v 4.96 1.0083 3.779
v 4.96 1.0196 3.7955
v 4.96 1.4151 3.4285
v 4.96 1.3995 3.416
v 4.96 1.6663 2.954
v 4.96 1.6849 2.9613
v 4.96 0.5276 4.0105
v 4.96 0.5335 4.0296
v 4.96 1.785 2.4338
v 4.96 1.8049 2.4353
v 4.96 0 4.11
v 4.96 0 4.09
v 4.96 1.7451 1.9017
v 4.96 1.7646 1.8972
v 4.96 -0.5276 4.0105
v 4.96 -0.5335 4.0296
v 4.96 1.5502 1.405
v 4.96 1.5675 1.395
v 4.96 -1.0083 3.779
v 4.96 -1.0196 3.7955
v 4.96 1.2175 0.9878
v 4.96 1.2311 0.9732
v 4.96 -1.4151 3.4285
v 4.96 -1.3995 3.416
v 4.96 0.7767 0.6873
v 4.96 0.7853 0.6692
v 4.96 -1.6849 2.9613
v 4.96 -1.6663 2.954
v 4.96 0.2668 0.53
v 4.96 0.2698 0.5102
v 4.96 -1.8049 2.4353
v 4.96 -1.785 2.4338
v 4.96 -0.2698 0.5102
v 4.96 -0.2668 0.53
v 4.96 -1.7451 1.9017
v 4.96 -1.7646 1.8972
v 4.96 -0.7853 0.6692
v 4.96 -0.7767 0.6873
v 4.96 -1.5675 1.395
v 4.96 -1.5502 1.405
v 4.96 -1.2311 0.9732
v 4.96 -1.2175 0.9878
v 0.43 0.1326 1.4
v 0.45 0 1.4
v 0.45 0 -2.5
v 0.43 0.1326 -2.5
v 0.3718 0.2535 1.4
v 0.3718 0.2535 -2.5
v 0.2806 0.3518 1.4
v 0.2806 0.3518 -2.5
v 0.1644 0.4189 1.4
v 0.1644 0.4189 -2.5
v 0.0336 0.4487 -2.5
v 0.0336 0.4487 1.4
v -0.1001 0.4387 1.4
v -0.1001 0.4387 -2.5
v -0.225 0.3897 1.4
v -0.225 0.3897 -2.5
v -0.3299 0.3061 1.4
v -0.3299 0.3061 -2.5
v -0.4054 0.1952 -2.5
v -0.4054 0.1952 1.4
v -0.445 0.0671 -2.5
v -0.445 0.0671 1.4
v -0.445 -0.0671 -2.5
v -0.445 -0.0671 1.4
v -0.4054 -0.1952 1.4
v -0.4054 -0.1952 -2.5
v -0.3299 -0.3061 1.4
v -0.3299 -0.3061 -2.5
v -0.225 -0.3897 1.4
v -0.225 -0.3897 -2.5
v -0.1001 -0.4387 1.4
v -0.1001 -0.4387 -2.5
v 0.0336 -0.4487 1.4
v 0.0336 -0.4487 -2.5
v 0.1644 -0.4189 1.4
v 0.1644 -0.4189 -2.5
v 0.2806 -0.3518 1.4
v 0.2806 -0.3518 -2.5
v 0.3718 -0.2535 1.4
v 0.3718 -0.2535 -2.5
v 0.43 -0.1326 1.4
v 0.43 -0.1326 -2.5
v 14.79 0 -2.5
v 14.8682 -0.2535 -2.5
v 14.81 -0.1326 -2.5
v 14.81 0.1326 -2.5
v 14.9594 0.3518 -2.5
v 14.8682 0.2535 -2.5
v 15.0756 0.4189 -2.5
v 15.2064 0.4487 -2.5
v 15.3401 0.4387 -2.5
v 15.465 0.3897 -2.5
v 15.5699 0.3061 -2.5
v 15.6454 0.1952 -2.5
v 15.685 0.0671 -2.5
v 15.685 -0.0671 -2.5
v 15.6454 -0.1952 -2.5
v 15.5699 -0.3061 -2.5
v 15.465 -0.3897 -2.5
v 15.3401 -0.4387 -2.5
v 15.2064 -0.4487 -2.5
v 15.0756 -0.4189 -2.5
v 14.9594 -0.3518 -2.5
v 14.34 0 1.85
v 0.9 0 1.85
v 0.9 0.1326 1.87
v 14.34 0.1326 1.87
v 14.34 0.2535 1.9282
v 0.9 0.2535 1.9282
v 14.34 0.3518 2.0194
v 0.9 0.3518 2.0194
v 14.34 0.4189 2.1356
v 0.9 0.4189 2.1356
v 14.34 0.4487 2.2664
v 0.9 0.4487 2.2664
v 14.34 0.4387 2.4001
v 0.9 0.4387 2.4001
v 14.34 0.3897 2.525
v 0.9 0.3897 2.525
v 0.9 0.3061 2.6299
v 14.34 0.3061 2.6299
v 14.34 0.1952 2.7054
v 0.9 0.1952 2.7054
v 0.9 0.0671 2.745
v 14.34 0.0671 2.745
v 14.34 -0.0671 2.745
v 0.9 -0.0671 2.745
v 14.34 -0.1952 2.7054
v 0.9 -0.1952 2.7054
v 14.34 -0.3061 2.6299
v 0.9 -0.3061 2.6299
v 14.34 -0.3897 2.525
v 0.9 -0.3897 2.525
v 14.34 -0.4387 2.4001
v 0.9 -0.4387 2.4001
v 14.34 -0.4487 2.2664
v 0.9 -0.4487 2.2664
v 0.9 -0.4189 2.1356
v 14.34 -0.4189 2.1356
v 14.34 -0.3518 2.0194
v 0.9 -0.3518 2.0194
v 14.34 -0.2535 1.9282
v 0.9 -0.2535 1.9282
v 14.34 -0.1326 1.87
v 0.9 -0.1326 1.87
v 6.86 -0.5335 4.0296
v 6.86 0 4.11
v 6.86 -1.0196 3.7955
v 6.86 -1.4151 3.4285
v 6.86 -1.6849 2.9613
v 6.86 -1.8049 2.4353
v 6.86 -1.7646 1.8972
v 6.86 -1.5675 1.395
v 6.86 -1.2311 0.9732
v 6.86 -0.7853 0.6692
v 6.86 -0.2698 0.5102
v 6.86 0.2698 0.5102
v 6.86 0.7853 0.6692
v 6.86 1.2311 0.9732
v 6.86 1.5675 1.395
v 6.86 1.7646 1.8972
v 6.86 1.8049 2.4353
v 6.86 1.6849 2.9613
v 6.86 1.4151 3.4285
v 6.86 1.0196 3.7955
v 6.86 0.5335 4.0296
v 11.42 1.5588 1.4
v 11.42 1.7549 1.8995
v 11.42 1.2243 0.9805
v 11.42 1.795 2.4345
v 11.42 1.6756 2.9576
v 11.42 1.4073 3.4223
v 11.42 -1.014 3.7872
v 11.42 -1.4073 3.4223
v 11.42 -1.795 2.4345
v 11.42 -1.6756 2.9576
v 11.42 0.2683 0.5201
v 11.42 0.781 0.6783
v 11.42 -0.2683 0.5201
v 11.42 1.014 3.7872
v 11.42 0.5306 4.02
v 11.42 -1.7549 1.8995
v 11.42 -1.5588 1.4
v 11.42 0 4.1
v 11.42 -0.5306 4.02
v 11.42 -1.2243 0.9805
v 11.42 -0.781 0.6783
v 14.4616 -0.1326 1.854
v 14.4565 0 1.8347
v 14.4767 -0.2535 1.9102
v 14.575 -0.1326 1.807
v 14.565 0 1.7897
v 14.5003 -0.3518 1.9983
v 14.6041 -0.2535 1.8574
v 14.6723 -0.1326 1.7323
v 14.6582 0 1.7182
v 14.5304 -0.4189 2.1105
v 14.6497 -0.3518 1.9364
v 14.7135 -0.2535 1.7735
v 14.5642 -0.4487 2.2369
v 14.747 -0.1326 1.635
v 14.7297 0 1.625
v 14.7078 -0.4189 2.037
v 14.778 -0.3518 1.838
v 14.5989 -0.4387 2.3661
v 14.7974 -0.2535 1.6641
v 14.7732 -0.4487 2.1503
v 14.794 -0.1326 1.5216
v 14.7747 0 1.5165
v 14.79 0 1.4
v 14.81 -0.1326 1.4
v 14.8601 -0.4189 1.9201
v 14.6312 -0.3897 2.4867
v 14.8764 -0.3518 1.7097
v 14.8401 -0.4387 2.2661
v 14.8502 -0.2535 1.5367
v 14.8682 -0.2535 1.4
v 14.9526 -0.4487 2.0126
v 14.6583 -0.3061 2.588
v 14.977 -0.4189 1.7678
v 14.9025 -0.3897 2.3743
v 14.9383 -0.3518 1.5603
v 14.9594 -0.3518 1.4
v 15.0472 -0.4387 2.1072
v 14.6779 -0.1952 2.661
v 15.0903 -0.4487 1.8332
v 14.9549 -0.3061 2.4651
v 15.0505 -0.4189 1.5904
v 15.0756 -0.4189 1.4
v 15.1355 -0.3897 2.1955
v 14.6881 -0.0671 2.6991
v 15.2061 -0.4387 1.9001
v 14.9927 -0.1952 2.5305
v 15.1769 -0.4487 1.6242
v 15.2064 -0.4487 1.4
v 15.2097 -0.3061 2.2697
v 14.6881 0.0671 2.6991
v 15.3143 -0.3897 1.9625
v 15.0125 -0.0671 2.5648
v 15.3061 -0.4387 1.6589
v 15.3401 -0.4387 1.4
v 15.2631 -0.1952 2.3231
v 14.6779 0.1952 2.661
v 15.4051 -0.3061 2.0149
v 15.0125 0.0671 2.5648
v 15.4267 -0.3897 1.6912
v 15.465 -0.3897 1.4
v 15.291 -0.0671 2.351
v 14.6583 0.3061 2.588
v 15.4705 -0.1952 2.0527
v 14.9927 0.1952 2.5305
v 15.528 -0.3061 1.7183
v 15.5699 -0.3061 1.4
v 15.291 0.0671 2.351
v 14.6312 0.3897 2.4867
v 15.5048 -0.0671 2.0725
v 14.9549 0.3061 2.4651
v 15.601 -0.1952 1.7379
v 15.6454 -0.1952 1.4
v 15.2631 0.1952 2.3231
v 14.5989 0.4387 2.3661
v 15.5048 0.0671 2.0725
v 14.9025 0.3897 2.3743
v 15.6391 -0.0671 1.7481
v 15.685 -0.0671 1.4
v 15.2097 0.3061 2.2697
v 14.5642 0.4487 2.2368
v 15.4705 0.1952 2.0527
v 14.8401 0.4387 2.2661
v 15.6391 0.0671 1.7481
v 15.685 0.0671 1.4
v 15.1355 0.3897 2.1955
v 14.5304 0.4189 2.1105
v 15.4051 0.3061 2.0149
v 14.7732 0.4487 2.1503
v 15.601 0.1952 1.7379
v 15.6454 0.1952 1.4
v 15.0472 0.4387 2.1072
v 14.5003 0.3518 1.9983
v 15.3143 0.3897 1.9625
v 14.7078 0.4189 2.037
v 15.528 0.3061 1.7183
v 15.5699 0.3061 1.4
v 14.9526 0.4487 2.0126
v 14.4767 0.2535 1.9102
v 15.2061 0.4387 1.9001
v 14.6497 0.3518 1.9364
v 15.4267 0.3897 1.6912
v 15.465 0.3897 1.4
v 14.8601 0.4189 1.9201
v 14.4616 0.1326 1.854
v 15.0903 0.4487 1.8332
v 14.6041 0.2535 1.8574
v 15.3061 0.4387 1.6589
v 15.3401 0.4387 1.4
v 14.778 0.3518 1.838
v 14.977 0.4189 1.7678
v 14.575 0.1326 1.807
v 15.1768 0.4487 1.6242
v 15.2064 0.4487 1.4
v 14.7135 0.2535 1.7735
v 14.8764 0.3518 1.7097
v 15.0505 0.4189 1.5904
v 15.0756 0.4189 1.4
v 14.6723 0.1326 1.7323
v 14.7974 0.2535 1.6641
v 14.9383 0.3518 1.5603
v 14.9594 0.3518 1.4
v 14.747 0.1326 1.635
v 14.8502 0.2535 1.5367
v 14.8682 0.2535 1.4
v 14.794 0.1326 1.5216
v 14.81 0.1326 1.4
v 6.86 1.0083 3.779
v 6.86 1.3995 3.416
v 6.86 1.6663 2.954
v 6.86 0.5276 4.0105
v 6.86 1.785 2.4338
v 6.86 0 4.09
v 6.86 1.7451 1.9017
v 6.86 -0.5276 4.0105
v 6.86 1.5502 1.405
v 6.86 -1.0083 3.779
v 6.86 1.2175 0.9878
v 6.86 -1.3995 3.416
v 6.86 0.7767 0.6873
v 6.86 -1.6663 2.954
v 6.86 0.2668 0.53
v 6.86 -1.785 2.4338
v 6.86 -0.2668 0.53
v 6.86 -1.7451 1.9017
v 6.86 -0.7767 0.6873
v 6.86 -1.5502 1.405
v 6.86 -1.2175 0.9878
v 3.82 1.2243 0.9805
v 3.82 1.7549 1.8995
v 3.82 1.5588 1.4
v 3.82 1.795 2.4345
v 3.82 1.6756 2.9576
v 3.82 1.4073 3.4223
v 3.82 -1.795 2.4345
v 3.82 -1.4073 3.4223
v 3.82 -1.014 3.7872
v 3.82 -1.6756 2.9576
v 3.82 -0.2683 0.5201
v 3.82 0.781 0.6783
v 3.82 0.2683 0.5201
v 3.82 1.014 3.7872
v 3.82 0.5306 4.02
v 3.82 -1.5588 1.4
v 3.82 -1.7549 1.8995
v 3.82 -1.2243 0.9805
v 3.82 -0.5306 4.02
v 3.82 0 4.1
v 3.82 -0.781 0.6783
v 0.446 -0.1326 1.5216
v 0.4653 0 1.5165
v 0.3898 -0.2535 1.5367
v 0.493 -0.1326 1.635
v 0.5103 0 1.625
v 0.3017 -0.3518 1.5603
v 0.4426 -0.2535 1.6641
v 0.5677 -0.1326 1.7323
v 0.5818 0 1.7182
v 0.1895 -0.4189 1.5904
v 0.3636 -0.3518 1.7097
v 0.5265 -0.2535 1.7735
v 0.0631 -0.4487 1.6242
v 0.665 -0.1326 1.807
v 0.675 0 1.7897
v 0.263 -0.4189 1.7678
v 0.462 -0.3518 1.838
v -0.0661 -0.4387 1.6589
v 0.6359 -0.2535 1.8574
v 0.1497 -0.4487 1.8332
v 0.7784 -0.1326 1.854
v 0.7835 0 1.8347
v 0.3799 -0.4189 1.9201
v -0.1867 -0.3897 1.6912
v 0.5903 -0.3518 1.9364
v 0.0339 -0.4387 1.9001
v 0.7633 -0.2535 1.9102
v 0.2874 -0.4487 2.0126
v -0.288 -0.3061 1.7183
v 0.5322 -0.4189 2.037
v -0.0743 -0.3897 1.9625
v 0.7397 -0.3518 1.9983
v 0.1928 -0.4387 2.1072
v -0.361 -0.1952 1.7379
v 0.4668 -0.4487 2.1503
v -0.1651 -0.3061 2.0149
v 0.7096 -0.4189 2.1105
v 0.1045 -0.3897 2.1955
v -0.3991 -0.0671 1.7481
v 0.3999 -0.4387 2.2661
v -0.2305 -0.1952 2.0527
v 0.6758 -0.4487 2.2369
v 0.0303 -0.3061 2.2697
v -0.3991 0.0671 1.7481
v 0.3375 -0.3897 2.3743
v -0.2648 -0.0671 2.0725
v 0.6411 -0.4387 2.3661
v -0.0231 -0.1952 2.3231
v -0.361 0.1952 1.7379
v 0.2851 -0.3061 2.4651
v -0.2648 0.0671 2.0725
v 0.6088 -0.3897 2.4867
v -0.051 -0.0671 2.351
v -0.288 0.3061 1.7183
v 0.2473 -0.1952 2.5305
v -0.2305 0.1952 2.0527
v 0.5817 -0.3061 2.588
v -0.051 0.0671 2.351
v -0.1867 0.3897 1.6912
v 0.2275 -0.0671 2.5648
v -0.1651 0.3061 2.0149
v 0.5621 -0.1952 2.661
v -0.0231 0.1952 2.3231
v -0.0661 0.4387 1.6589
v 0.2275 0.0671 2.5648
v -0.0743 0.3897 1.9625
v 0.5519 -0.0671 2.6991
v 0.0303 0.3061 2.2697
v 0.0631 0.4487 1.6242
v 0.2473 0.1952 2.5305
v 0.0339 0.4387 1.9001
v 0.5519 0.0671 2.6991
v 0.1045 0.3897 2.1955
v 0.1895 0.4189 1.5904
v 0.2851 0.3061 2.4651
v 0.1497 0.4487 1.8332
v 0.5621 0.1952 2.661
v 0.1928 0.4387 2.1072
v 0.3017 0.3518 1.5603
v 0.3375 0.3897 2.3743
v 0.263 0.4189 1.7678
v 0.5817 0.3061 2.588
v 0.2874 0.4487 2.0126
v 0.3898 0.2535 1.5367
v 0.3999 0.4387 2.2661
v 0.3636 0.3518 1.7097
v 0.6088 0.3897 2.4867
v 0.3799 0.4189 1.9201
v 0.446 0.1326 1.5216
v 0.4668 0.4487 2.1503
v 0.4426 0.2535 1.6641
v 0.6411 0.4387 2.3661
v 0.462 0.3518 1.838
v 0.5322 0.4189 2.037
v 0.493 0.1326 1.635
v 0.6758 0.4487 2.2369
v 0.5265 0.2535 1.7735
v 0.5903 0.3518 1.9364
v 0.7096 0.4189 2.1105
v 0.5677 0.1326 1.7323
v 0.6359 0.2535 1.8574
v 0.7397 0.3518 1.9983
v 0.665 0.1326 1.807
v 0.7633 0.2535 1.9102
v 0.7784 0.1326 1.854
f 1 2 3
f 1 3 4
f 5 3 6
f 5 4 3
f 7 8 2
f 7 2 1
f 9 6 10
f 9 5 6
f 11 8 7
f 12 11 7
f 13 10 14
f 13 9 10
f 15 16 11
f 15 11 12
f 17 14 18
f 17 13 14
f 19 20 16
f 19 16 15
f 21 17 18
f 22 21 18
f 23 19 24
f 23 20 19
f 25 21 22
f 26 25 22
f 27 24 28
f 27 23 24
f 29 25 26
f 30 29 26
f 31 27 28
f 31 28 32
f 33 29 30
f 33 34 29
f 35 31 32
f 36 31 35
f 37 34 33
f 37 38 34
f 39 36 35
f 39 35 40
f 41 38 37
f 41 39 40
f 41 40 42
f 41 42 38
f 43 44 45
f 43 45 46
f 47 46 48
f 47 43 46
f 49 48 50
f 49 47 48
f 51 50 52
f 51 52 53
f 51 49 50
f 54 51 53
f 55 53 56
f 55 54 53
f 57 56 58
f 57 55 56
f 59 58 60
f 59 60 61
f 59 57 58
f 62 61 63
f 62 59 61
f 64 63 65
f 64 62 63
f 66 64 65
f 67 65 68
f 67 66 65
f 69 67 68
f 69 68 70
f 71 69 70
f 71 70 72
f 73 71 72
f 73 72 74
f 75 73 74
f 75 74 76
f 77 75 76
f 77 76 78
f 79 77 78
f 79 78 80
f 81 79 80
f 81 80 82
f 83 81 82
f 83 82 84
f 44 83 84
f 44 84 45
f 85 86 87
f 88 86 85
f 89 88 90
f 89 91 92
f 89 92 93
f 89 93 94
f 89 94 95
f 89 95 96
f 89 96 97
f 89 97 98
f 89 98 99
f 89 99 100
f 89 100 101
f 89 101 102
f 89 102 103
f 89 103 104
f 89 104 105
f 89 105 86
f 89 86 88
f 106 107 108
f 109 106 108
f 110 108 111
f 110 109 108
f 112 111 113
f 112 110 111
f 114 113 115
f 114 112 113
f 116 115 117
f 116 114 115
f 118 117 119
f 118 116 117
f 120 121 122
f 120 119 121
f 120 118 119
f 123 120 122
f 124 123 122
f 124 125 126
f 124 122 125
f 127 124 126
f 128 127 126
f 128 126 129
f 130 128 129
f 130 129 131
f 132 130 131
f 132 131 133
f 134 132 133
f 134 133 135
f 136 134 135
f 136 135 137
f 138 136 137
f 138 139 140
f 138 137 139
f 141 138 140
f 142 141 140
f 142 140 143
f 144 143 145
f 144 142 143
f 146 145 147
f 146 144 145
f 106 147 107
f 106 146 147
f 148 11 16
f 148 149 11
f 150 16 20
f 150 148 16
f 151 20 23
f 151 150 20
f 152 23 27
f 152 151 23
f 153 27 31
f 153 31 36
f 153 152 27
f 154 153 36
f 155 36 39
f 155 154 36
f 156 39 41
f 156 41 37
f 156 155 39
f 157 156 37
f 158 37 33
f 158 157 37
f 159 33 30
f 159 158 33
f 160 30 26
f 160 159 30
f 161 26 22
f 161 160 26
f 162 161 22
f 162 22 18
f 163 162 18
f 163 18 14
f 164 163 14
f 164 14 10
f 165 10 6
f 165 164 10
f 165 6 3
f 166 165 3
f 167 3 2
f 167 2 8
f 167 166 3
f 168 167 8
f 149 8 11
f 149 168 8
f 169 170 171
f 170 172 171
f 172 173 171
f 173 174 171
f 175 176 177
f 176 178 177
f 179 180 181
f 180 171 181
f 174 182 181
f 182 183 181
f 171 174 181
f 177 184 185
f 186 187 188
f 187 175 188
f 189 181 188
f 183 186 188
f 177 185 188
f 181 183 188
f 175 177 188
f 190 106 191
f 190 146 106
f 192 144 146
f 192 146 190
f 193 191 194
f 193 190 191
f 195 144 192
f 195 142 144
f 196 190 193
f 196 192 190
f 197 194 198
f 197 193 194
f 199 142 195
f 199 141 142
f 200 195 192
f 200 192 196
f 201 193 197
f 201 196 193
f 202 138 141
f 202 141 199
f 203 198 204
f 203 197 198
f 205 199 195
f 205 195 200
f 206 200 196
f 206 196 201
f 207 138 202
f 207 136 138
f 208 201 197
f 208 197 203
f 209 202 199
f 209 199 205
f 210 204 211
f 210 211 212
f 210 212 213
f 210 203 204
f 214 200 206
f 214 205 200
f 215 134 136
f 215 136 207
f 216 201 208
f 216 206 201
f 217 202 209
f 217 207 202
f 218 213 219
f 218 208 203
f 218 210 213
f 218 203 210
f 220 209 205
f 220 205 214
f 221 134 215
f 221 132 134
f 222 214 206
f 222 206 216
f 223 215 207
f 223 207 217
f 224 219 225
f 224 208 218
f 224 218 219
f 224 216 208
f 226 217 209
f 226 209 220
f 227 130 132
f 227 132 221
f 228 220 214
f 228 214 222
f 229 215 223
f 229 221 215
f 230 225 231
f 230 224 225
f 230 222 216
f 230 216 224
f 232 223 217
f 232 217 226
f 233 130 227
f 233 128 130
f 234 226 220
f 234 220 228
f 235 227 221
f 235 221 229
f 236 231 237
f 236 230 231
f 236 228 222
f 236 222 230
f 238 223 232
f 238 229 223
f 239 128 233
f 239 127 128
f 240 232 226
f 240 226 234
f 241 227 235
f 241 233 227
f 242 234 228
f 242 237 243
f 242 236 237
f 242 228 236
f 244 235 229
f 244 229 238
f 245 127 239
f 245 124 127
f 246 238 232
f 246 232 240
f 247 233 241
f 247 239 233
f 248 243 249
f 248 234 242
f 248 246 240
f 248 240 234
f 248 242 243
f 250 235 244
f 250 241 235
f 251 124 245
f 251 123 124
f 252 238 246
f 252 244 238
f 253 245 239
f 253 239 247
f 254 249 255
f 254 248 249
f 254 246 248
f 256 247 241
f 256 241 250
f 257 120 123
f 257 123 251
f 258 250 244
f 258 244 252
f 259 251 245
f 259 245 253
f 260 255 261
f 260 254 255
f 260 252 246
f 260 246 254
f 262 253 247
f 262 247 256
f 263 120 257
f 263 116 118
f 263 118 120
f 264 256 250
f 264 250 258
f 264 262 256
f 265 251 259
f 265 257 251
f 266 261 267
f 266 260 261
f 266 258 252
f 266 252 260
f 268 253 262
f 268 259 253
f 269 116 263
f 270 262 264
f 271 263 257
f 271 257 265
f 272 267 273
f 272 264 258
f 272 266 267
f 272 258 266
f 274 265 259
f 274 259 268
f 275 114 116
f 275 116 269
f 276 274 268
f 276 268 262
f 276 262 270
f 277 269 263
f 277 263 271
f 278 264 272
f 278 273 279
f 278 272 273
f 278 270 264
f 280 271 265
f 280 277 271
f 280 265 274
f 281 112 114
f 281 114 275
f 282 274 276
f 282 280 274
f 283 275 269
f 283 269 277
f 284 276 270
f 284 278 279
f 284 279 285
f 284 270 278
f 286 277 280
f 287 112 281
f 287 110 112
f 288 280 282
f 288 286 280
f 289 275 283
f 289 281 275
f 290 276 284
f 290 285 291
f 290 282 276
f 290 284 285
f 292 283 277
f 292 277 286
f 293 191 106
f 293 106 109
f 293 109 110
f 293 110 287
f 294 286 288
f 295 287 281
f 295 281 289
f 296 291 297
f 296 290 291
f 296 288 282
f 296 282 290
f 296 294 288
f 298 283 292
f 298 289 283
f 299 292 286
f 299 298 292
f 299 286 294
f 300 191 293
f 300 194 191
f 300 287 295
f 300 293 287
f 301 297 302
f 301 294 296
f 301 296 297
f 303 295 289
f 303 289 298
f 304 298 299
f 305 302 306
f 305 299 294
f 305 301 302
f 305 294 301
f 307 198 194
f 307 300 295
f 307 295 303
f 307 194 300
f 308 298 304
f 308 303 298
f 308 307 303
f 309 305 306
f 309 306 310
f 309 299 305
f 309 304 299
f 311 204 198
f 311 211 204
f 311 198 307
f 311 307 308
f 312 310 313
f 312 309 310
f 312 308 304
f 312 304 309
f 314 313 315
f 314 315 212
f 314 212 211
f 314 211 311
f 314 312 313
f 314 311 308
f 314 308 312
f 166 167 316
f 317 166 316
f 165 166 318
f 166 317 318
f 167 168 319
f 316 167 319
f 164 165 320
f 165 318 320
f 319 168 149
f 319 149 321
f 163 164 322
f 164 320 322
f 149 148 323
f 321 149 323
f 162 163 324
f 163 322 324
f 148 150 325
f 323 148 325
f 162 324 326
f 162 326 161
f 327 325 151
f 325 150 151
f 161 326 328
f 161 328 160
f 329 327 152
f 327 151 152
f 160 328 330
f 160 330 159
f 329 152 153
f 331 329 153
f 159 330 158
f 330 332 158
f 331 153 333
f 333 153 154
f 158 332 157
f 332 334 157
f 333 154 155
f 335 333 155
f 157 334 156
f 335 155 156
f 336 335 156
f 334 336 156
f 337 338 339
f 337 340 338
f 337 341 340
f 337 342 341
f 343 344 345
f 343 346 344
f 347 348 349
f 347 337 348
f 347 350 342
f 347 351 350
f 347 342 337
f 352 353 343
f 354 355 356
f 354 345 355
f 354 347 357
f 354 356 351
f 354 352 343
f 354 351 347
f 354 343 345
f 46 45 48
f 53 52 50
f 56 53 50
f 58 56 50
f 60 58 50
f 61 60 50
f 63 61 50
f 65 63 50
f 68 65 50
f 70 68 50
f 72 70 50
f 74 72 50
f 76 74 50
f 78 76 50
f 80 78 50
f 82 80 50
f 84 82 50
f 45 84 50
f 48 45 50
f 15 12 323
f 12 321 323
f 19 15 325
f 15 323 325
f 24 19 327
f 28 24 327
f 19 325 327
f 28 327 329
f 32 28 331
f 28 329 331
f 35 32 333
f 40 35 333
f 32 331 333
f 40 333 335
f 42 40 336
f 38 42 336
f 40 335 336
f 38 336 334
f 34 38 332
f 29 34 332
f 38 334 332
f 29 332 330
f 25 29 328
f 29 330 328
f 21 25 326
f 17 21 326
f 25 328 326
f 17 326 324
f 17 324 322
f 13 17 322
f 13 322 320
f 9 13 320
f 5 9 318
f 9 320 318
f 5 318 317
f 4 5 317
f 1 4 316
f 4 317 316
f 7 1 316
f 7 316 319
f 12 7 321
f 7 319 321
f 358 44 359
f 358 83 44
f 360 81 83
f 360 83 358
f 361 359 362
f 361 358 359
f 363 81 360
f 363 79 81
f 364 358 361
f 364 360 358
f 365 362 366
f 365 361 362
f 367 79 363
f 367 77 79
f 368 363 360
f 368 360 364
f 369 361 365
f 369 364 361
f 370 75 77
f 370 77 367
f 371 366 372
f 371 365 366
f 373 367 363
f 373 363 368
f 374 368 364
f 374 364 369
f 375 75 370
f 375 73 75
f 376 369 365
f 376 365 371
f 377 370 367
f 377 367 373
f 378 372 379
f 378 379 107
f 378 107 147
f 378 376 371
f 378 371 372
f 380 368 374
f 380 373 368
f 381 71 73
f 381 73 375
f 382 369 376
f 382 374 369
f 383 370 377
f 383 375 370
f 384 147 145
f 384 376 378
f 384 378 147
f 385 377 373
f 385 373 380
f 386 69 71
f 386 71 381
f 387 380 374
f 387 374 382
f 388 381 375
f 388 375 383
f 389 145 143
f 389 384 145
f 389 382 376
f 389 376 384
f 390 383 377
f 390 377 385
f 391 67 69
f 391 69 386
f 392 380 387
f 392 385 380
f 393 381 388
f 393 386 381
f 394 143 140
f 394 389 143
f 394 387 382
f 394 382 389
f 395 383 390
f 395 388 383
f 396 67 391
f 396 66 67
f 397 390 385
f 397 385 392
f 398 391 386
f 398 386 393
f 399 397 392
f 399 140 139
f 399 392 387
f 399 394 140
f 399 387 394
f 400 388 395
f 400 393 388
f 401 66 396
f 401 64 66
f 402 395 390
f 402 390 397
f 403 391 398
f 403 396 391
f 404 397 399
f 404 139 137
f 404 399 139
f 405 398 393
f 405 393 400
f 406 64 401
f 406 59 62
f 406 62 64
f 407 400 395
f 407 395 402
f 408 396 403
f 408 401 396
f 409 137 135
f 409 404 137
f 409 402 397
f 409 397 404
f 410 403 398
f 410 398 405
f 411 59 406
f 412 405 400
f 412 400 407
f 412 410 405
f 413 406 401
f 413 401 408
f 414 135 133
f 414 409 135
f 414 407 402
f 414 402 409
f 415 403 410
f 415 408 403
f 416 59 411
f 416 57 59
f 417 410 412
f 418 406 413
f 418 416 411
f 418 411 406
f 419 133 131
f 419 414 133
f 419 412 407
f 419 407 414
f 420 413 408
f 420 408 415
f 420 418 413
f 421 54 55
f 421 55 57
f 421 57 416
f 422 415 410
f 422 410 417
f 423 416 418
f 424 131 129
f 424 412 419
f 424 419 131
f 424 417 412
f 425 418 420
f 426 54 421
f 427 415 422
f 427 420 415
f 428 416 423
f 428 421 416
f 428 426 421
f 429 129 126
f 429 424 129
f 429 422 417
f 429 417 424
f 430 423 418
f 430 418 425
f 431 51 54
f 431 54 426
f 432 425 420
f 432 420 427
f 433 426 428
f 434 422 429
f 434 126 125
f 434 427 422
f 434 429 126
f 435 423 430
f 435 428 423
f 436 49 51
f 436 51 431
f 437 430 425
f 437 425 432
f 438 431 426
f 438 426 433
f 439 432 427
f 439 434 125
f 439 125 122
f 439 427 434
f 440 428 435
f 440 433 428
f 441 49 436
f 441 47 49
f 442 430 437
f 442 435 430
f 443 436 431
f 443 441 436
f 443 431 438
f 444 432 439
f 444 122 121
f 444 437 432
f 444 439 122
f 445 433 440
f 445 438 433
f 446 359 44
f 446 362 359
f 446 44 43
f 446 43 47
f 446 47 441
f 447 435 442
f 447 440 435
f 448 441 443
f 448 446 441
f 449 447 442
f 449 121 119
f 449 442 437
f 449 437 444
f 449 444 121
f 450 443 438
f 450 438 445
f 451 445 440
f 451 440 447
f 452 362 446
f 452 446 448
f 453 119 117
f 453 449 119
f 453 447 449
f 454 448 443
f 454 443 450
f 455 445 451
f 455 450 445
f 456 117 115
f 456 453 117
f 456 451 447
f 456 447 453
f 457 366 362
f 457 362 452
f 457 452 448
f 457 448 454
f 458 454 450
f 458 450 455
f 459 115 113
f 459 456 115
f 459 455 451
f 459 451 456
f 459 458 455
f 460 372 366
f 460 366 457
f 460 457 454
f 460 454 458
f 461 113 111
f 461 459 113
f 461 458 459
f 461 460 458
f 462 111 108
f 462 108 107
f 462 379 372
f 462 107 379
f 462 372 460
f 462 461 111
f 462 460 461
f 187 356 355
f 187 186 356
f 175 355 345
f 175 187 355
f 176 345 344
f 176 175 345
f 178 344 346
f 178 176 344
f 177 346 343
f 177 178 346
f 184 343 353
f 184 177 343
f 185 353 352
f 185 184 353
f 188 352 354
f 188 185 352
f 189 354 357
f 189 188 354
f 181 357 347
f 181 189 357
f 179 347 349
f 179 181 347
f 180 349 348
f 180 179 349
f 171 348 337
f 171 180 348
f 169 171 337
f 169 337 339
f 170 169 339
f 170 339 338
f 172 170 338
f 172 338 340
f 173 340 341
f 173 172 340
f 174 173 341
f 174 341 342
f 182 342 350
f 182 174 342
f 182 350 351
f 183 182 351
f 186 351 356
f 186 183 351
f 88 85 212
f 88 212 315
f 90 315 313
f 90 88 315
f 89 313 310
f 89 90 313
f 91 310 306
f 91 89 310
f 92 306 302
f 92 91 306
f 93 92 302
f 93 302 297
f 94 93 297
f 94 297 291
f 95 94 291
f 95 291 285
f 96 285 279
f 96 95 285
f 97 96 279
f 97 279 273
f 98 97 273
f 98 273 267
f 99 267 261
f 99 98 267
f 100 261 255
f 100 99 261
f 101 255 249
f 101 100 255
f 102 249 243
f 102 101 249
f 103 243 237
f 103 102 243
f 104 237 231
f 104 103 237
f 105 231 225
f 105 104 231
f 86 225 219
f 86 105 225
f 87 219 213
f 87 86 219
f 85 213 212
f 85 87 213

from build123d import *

# Parameters (mm, degrees)
SKETCH002_W = 7.6
SKETCH002_H = 1.8
SKETCH003_W = 1.9
SKETCH003_H = 0.02
SKETCH_R    = 0.45


with BuildPart() as revolution:
    # Sketch002 → Revolution (revolve)
    with BuildSketch(Plane.XZ):
        with Locations((7.62, 3.2)):
            Rectangle(SKETCH002_W, SKETCH002_H)
    revolve(axis=Axis((3.82, 0, 2.3), (1, 0, 0)))


with BuildPart() as revolution001:
    # Sketch003 → Revolution001 (revolve)
    with BuildSketch(Plane.XZ):
        with Locations((5.91, 4.1)):
            Rectangle(SKETCH003_W, SKETCH003_H)
    revolve(axis=Axis((0, 0, 2.3), (1, 0, 0)))


with BuildPart() as sweep_body:
    # Sweep: sweep along a path in Sketch001
    with BuildLine(Plane.XZ) as sweep_path:
        Line((0, -2.5), (0, 1.4))
        ThreePointArc((0, 1.4), (0.263604, 2.036396), (0.9, 2.3))
        Line((0.9, 2.3), (14.34, 2.3))
        ThreePointArc((14.34, 2.3), (14.976396, 2.036396), (15.24, 1.4))
        Line((15.24, 1.4), (15.24, -2.5))
    # Sketch → Sweep (sweep)
    with BuildSketch(Plane.XY.offset(-2)):
        Circle(SKETCH_R)
    sweep(path=sweep_path.line)


solid = Compound([revolution.part, revolution001.part, sweep_body.part])
